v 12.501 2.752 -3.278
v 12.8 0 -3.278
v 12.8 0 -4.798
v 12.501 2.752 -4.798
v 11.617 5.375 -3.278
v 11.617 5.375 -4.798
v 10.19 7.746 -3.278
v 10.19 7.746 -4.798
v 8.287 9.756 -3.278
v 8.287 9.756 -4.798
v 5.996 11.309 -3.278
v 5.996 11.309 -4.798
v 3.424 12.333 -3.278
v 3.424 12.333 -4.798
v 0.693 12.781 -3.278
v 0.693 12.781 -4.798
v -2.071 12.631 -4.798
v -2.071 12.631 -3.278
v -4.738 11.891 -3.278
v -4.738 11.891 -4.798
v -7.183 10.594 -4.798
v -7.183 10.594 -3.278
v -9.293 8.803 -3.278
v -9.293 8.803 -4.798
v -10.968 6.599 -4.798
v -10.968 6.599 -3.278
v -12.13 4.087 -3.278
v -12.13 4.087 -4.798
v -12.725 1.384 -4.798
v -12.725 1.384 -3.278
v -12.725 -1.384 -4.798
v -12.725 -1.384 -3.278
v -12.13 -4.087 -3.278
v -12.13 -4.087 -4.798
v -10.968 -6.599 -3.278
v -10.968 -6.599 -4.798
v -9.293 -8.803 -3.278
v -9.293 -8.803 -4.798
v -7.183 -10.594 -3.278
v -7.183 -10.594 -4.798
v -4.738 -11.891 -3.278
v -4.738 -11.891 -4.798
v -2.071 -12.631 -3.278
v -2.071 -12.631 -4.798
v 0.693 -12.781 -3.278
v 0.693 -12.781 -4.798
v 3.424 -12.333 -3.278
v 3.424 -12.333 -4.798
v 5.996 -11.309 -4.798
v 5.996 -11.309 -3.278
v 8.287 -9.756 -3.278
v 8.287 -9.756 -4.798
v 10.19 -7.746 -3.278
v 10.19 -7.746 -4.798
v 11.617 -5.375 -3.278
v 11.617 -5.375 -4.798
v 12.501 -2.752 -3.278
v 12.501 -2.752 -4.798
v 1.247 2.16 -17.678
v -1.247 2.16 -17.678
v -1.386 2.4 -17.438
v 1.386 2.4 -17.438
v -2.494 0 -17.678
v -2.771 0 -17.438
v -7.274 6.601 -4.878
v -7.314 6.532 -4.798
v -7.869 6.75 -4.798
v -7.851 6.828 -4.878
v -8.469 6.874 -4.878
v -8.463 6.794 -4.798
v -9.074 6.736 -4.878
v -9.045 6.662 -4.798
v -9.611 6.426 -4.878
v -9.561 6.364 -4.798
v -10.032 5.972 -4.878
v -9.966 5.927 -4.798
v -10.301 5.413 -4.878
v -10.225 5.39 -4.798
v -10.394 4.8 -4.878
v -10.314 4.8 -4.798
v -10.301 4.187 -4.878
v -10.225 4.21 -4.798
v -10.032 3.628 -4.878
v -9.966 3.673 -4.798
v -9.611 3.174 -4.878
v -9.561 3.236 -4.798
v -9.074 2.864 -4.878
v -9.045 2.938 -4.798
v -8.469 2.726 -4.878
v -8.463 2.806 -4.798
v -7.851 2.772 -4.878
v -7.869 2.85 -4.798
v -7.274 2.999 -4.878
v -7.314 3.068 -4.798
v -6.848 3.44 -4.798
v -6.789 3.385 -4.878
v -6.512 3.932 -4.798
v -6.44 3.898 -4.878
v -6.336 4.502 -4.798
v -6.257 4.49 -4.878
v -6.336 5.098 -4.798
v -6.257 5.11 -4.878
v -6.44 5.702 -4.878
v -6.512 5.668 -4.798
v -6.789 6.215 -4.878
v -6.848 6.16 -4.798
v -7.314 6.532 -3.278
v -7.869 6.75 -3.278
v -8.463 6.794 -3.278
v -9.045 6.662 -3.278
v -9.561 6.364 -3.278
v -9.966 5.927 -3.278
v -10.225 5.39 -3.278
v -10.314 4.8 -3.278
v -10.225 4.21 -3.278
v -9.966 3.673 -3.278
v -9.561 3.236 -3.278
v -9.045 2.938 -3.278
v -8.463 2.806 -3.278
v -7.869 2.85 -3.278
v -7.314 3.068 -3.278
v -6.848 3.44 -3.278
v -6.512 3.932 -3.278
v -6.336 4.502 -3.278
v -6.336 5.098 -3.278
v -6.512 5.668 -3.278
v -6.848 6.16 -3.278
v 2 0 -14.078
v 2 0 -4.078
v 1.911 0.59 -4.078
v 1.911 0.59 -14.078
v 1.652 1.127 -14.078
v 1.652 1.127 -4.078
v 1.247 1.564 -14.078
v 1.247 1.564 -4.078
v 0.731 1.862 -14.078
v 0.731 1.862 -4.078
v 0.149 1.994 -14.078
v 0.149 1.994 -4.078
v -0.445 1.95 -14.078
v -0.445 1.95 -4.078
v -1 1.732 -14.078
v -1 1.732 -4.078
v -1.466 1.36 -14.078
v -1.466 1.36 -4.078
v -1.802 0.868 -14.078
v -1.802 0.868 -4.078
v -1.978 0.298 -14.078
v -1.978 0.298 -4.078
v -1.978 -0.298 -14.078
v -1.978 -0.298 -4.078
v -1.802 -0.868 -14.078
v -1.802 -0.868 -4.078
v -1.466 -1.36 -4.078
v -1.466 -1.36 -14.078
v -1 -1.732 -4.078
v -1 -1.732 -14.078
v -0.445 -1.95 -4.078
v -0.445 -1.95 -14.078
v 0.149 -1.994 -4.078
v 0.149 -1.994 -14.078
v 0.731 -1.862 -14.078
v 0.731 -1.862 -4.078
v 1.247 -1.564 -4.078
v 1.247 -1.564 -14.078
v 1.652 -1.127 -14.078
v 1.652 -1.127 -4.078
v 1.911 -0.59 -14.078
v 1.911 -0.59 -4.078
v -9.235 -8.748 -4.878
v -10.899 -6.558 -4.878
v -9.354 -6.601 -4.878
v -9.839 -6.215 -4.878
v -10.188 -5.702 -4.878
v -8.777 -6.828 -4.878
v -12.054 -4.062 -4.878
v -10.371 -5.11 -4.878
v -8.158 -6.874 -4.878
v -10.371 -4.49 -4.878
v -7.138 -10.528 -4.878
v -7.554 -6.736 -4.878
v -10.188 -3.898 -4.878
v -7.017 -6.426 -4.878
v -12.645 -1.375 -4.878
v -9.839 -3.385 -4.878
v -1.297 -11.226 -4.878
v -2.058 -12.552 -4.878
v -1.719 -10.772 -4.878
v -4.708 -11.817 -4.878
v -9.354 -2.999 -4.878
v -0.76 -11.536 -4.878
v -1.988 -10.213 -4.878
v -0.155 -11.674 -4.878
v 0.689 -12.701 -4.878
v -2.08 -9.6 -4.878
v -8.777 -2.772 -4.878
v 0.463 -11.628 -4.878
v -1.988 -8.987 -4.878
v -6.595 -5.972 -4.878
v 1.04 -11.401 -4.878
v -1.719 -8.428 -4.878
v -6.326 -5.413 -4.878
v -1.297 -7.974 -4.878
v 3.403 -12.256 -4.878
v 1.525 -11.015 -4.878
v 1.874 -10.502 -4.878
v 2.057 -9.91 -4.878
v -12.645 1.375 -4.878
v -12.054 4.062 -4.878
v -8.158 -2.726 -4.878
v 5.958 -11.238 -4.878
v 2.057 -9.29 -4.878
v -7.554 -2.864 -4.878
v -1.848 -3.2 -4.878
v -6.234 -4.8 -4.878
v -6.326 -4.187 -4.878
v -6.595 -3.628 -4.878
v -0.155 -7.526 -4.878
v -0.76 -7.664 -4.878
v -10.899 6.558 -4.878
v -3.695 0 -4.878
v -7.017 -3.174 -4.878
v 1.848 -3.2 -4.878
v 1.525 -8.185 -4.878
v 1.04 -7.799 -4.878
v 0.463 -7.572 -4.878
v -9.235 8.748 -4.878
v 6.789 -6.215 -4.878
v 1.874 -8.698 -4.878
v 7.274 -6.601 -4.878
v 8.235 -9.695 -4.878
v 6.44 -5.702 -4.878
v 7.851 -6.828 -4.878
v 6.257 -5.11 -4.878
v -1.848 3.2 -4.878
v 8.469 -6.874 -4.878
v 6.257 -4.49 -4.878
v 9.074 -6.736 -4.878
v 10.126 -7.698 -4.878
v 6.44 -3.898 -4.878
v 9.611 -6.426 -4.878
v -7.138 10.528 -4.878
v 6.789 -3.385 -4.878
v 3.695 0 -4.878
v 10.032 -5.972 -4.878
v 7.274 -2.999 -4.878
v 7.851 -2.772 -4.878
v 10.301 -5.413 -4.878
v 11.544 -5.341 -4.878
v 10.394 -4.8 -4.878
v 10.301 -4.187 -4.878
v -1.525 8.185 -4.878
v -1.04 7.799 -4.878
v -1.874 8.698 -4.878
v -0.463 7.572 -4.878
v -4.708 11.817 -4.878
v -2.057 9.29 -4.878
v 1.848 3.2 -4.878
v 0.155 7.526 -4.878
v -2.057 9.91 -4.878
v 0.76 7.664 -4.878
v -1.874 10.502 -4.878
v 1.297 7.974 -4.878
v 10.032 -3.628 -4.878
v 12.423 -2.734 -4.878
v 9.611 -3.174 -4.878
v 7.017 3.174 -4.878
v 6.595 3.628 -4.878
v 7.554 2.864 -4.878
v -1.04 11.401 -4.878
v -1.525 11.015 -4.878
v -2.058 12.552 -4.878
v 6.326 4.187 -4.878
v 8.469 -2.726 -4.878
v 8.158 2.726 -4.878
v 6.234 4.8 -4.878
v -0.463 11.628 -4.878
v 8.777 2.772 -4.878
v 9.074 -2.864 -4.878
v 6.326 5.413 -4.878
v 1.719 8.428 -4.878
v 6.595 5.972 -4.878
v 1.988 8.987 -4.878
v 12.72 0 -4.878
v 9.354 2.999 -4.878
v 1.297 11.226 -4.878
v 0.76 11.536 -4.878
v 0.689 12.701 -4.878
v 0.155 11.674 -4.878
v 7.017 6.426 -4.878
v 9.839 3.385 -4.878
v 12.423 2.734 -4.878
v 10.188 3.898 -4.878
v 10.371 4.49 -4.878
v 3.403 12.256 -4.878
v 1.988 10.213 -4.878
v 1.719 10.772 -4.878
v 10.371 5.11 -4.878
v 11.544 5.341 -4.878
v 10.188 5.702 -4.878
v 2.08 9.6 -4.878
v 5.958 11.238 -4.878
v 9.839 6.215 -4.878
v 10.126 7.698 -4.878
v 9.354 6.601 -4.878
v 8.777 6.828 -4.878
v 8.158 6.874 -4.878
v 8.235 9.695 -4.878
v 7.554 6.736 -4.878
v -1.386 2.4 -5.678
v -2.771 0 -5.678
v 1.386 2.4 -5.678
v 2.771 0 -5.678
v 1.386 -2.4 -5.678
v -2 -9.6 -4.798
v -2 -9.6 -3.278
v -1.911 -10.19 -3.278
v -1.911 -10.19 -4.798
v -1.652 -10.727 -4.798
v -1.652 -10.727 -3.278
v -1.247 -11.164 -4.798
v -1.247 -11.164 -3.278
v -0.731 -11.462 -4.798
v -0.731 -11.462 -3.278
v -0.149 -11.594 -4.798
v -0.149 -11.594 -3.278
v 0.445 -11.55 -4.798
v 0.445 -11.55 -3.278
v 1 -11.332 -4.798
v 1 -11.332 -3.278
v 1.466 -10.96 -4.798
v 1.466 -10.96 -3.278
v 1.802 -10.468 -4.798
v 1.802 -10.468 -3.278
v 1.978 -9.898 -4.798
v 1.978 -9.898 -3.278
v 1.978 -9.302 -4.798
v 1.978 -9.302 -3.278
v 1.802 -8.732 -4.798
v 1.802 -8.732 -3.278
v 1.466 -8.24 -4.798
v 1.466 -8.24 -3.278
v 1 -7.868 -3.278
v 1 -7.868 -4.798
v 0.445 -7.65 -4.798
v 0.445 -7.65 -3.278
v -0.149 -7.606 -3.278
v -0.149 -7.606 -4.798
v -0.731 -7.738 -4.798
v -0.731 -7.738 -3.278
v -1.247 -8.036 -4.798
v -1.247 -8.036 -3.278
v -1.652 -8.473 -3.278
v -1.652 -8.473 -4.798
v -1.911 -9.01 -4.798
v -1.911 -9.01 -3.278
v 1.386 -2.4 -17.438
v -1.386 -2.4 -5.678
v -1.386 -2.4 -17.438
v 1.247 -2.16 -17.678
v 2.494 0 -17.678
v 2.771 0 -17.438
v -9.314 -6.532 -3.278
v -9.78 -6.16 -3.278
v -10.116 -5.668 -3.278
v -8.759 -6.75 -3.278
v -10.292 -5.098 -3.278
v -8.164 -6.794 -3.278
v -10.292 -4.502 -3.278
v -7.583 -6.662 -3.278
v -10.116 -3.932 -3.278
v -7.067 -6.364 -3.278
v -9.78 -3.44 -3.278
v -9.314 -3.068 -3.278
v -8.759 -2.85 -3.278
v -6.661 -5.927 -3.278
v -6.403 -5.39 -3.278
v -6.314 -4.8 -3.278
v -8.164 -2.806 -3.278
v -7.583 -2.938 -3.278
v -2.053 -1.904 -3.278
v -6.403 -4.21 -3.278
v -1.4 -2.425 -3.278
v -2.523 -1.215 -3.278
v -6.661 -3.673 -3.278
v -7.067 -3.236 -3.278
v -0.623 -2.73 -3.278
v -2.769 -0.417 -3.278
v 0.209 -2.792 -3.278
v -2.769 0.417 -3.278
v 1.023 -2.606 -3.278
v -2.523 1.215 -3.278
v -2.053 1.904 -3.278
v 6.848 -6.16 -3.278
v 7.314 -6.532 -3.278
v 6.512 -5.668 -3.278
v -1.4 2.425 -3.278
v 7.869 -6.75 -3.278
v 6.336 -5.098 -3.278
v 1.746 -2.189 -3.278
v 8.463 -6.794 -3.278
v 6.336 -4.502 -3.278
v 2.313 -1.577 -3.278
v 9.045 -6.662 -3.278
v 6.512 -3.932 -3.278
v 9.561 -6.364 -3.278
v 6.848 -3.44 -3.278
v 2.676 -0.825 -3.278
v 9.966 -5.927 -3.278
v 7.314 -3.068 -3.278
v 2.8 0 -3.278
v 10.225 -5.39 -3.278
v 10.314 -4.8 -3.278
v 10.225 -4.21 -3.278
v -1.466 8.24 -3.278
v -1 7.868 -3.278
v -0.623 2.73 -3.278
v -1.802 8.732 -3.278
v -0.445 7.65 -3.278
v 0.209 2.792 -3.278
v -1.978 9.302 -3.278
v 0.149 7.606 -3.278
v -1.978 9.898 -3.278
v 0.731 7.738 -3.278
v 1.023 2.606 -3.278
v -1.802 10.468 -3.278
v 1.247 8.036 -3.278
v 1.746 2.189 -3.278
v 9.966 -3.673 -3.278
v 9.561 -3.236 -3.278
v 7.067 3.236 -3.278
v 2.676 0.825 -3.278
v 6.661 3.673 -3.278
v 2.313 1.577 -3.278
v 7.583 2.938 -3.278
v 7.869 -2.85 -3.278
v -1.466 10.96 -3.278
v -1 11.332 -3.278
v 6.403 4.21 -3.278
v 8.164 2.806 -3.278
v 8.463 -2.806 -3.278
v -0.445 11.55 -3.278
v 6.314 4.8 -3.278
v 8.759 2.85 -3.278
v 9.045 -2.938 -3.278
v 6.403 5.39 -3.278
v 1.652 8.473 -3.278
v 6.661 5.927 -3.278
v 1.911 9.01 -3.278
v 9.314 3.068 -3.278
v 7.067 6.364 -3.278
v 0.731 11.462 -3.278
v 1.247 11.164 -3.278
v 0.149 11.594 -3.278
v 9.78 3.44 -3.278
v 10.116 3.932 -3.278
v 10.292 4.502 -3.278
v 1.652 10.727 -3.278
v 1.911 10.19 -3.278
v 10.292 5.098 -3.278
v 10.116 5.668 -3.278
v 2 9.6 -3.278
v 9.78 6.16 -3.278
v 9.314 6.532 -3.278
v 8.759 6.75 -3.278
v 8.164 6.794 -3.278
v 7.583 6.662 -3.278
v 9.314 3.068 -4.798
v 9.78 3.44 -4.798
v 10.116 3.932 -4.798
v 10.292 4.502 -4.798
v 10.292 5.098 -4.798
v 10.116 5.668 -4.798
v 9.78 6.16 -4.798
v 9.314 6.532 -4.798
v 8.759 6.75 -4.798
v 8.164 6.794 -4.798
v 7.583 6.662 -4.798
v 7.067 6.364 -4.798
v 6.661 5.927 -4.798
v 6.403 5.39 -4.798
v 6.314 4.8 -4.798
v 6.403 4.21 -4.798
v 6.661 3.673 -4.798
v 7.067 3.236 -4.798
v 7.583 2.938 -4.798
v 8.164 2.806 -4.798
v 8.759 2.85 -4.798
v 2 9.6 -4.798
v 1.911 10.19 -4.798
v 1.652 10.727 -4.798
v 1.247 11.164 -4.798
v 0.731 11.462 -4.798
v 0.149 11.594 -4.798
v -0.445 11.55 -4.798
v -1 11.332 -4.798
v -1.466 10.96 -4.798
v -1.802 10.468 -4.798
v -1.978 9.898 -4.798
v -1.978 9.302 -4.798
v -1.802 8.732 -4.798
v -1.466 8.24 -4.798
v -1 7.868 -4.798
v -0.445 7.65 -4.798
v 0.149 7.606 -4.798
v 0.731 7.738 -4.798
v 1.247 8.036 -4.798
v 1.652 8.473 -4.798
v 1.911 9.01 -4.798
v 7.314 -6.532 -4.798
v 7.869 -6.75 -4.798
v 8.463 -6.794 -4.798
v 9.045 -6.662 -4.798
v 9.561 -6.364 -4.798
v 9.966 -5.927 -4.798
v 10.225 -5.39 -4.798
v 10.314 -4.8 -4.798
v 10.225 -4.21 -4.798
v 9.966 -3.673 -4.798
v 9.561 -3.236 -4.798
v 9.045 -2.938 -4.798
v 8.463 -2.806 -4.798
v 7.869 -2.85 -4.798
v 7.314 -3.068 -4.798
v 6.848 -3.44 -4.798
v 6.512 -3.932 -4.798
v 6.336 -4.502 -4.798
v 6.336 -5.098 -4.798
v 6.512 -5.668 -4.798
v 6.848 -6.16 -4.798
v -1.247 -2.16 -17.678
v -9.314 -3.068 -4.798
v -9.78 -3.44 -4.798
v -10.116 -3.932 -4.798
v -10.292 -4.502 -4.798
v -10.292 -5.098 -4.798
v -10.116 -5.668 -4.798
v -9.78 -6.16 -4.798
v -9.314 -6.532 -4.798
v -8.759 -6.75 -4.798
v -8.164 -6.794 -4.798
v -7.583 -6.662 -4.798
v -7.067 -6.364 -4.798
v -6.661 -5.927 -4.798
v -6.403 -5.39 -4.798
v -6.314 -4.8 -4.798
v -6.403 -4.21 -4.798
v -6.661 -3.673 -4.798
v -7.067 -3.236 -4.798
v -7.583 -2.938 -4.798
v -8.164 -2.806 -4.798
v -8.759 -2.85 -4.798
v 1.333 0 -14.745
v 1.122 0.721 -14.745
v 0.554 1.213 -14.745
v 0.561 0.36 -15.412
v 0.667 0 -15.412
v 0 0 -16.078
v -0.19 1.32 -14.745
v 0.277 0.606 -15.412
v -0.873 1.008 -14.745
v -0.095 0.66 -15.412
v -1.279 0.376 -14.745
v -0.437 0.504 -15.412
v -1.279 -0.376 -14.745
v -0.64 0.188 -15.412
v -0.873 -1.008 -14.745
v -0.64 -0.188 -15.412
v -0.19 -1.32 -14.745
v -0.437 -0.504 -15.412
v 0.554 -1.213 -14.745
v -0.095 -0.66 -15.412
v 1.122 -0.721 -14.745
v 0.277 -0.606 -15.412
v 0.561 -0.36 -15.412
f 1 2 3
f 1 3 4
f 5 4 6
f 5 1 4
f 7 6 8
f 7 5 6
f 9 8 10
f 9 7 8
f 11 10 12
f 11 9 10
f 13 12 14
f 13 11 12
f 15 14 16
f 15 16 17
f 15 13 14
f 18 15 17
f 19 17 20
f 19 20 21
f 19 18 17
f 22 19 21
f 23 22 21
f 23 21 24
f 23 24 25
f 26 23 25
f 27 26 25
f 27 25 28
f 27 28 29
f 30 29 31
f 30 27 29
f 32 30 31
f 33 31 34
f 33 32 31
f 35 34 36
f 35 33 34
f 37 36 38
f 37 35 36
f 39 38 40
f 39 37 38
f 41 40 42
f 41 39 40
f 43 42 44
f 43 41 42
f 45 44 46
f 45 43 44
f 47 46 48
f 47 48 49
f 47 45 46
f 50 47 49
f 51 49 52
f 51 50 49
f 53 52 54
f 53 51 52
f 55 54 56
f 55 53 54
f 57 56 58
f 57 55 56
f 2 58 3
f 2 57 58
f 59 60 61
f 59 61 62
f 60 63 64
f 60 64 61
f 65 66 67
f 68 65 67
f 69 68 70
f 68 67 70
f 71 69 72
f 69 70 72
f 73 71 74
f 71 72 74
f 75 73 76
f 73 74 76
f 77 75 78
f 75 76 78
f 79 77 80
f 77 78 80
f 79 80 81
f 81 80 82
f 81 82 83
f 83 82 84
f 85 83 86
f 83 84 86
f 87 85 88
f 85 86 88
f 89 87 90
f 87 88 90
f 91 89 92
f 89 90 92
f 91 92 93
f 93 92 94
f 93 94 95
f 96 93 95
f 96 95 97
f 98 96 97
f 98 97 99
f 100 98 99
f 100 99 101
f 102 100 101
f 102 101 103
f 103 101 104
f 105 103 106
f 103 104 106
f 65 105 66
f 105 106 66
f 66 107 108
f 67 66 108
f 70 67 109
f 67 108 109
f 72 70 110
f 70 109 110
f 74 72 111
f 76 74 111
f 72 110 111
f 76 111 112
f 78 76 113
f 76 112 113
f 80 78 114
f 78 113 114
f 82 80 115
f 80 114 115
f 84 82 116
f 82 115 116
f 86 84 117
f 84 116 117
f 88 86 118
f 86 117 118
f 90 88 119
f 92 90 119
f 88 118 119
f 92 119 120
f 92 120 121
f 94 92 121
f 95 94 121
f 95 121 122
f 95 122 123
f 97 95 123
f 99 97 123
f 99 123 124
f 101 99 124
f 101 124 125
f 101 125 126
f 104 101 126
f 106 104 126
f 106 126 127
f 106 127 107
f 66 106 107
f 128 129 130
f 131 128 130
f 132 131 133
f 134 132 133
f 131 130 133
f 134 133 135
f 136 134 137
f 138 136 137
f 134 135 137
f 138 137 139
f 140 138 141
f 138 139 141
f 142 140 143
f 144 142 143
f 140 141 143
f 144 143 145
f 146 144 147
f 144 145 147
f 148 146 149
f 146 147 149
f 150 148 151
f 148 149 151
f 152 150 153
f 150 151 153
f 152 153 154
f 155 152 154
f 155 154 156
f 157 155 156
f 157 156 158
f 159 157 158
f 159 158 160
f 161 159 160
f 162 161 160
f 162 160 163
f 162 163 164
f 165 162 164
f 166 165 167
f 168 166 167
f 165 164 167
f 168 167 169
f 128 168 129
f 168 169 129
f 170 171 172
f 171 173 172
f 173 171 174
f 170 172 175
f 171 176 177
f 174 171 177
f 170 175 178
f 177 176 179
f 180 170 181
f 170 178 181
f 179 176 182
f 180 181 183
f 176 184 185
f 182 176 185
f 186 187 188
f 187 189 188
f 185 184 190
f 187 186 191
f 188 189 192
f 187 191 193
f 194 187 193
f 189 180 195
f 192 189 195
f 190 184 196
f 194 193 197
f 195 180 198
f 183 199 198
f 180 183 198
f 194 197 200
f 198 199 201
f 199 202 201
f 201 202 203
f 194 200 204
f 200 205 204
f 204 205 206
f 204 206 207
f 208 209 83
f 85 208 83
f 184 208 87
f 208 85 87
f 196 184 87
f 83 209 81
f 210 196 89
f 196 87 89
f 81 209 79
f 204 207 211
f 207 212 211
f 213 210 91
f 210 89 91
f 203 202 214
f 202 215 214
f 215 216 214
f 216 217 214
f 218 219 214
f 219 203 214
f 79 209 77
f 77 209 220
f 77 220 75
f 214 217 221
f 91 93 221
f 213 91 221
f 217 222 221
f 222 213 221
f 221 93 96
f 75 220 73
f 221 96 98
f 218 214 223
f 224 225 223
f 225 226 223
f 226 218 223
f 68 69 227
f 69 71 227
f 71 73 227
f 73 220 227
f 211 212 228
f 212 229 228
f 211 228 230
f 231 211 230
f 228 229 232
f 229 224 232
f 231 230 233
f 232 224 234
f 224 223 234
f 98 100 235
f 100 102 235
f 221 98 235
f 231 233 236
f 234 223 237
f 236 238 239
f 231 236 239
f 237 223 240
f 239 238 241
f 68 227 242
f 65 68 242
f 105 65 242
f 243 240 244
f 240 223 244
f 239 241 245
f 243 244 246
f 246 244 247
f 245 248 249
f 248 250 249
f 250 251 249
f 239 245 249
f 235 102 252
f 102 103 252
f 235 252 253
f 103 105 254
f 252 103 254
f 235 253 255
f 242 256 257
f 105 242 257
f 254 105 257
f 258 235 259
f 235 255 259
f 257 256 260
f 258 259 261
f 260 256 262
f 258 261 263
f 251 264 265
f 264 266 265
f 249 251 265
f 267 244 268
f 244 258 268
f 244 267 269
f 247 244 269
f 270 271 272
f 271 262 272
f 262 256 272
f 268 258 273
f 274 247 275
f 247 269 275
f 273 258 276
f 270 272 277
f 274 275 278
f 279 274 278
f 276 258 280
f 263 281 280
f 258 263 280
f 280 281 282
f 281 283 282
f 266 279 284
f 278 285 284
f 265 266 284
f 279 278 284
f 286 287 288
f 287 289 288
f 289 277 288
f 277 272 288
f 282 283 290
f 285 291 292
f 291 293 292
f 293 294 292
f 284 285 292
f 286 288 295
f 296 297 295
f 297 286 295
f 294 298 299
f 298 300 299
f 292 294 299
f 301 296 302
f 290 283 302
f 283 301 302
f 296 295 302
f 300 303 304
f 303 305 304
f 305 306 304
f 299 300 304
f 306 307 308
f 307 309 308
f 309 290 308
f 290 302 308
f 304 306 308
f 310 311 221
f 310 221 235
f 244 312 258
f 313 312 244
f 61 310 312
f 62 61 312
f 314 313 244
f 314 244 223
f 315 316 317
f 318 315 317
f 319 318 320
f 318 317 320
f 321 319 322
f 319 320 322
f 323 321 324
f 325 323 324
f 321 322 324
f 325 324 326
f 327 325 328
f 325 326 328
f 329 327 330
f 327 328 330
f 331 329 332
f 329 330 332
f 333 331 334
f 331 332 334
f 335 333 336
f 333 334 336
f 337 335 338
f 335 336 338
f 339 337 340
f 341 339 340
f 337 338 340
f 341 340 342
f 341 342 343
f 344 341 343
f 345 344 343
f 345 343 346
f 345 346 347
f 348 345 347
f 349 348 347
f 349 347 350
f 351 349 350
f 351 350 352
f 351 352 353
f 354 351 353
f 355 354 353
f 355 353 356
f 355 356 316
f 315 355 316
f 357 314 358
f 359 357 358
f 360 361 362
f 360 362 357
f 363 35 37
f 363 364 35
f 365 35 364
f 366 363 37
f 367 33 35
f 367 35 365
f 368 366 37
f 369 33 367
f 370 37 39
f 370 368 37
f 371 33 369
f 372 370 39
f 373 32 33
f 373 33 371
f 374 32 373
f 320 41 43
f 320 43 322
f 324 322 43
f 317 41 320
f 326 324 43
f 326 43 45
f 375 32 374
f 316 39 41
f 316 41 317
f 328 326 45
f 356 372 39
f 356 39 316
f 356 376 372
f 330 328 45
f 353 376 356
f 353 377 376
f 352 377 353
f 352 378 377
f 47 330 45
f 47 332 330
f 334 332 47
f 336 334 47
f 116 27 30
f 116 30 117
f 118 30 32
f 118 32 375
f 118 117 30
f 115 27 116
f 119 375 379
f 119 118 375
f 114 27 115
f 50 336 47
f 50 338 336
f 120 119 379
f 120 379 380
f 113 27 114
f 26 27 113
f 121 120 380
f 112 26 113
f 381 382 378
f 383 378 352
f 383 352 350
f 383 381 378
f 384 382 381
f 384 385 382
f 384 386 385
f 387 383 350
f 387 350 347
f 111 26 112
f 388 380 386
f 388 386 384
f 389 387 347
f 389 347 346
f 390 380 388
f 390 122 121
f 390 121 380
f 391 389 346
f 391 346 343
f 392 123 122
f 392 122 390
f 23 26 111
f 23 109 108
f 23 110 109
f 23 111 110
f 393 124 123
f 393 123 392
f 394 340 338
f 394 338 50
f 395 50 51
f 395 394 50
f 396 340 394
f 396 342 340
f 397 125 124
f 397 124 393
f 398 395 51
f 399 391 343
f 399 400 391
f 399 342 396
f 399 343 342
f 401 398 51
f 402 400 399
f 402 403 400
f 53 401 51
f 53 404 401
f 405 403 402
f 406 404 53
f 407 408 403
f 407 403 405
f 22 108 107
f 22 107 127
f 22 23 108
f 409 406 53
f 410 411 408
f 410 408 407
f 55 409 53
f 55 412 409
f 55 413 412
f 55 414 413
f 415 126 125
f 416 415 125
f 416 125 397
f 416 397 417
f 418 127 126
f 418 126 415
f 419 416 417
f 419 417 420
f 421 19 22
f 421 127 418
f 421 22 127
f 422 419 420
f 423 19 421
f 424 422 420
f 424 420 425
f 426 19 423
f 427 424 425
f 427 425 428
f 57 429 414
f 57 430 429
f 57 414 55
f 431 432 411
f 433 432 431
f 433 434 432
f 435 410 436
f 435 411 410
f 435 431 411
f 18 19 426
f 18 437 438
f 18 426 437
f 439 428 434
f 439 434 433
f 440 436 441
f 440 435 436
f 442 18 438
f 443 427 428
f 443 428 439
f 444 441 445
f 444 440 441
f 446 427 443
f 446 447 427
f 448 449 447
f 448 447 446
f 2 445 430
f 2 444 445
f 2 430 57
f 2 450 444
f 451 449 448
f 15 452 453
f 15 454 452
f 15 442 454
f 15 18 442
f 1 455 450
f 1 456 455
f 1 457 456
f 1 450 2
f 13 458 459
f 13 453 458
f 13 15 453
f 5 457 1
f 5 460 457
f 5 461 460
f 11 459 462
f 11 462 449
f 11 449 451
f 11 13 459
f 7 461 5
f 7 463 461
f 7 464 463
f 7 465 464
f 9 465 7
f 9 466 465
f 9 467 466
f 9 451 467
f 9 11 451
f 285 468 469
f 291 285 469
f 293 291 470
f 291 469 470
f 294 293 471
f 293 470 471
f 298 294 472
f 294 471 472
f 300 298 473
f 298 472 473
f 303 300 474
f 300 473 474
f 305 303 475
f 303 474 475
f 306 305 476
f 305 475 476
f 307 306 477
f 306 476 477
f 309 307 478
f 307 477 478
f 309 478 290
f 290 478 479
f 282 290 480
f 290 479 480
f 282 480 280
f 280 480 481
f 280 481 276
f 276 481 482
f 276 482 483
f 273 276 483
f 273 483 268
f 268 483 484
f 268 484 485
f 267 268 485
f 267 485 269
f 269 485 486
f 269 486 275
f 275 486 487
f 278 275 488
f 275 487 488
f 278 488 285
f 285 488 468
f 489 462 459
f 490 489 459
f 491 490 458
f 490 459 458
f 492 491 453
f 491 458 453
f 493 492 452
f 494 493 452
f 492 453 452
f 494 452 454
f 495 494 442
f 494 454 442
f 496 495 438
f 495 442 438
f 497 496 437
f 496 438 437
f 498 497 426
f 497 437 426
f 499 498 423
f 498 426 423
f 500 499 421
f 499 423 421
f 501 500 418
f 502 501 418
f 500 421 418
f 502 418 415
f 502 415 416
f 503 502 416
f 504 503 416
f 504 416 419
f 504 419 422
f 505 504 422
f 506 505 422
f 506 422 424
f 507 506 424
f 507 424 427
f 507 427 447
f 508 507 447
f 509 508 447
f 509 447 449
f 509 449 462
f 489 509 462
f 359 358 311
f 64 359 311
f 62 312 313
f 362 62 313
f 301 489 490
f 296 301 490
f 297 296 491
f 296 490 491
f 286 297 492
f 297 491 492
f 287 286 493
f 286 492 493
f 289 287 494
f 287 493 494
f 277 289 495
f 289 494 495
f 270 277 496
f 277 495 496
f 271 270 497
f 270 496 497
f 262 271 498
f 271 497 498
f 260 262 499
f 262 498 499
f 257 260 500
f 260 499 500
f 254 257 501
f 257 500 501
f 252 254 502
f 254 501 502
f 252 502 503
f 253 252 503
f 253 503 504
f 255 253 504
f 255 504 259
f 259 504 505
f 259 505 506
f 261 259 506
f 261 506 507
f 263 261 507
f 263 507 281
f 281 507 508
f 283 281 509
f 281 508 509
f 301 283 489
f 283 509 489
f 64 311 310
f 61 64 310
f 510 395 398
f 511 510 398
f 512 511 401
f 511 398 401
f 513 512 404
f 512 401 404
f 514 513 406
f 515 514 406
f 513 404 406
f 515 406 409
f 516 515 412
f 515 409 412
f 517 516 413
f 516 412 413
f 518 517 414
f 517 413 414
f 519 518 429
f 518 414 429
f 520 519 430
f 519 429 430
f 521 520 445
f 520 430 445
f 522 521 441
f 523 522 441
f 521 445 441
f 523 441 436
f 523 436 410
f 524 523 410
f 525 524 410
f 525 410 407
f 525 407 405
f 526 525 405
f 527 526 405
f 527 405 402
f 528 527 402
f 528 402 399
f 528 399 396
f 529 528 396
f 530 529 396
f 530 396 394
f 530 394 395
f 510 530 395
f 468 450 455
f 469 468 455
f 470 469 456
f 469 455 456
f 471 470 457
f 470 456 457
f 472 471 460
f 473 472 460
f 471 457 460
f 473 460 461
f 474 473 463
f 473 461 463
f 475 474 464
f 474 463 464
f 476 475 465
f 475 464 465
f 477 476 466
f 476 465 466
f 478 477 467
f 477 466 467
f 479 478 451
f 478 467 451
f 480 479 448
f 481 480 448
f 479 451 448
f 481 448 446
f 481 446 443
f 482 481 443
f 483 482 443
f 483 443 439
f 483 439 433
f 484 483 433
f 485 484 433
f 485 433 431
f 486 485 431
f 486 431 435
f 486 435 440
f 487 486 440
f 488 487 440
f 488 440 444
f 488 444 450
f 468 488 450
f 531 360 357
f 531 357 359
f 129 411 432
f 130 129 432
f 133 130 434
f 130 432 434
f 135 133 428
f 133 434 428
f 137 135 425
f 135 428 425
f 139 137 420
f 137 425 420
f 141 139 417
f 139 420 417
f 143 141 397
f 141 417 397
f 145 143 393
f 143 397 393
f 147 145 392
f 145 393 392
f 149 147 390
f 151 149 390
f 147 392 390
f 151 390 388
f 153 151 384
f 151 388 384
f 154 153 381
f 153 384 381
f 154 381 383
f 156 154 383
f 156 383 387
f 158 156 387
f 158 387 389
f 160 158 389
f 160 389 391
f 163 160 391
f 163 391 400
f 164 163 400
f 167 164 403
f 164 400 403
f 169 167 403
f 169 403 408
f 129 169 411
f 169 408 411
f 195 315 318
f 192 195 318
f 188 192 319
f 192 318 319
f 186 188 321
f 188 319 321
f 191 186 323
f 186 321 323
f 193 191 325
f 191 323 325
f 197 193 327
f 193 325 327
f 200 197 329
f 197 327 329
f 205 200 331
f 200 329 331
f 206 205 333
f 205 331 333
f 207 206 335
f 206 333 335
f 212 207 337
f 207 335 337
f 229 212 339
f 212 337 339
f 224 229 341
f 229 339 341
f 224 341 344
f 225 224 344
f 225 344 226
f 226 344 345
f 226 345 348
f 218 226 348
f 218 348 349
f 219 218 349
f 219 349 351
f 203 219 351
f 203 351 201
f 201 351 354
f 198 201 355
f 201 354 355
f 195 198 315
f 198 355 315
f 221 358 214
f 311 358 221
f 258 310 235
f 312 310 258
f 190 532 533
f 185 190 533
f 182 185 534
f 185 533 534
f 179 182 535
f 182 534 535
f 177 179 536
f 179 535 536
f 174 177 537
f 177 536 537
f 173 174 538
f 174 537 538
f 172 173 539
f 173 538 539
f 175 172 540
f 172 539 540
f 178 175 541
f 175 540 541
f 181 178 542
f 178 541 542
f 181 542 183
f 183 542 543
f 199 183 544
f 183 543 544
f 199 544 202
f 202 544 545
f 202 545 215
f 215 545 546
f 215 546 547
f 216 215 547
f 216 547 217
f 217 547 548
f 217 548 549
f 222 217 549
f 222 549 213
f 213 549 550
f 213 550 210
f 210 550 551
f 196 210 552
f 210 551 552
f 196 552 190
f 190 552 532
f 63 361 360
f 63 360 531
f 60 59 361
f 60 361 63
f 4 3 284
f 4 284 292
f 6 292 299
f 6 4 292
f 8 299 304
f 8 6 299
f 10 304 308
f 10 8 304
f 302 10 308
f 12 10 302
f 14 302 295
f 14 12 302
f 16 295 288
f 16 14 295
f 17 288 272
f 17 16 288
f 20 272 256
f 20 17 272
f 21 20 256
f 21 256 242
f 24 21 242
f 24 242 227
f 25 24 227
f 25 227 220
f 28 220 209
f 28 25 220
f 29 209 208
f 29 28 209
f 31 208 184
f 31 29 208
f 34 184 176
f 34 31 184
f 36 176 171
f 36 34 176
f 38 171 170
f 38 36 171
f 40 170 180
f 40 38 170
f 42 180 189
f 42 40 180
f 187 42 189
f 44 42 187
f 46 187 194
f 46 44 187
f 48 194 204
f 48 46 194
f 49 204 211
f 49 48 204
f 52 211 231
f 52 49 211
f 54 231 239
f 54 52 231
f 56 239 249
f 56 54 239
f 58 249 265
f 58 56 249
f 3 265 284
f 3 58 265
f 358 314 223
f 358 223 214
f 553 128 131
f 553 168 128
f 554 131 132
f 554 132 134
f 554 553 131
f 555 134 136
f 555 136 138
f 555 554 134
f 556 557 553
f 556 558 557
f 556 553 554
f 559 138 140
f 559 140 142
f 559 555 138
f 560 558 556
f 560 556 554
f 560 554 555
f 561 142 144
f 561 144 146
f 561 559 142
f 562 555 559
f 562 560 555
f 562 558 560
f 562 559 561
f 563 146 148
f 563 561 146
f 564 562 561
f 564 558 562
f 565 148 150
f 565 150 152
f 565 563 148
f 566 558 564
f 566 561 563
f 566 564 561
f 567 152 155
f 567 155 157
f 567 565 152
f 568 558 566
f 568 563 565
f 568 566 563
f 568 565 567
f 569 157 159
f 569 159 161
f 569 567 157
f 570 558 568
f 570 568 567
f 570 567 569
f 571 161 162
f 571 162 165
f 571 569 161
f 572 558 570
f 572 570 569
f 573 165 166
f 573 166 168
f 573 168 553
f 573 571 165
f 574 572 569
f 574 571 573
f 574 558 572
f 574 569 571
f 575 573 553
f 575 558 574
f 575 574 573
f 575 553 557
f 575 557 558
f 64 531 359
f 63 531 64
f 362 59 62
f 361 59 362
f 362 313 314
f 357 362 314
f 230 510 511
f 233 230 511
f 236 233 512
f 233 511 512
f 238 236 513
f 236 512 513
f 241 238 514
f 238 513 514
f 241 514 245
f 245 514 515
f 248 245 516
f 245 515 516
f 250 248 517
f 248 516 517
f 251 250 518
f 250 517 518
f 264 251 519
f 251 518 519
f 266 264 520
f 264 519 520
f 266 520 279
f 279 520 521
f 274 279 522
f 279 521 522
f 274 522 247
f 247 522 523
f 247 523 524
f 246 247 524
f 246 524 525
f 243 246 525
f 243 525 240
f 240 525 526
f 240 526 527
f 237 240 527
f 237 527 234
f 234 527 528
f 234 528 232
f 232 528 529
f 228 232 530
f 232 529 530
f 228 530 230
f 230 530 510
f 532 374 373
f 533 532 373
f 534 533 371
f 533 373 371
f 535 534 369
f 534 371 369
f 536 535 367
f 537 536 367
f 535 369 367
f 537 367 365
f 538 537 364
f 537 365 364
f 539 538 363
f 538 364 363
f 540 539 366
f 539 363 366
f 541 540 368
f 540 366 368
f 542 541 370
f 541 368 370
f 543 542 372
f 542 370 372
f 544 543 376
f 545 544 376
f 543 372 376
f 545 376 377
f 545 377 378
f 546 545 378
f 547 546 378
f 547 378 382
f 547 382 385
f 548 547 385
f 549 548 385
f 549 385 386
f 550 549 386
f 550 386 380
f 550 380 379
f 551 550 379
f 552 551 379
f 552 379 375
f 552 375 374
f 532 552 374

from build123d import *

# Parameters (mm, degrees)
SKETCH1_R           = 32
BOSS_EXTRUDE1_DEPTH = 4
SKETCH2_R           = 5
CUT_EXTRUDE1_DEPTH  = 46.431266766
CIRPATTERN1_COUNT   = 6
BOSS_EXTRUDE2_DEPTH = 32
CHAMFER1_SIZE       = 2
CHAMFER2_SIZE       = 0.2
SKETCH4_R           = 5
CUT_EXTRUDE2_DEPTH  = 32
CHAMFER3_SIZE       = 0.6
CHAMFER4_SIZE       = 5
CHAMFER5_SIZE       = 2
SCALE1_SCALE        = 0.4


with BuildPart() as part:
    # Sketch1 → Boss-Extrude1 (new body)
    with BuildSketch(Plane.XY):
        Circle(SKETCH1_R)
    extrude(amount=-BOSS_EXTRUDE1_DEPTH)

    # Sketch2 → Cut-Extrude1 (cut, through all)
    with BuildSketch(Plane.XY):
        with Locations((0, 24)):
            Circle(SKETCH2_R)
    cut_extrude1 = extrude(amount=-CUT_EXTRUDE1_DEPTH, mode=Mode.SUBTRACT)

    # CirPattern1: Cut-Extrude1 ×6 about axis
    cirpattern1_axis = Axis((0, 0, 0), (0, 0, 1))
    for i in range(1, CIRPATTERN1_COUNT):
        add(cut_extrude1.rotate(cirpattern1_axis, i * 360 / CIRPATTERN1_COUNT), mode=Mode.SUBTRACT)

    # Sketch3 → Boss-Extrude2 (add)
    with BuildSketch(Plane(origin=(0, 0, -4), x_dir=(-1, 0, 0), z_dir=(0, 0, -1))):
        Polygon((-3.464101615, 6), (-6.92820323, 0), (-3.464101615, -6), (3.464101615, -6), (6.92820323, 0), (3.464101615, 6), align=None)
    extrude(amount=BOSS_EXTRUDE2_DEPTH)

    # Chamfer1
    chamfer1_edges = [part.edges().sort_by_distance(p)[0] for p in [
        (0, 6, -4),
        (5.196152423, 3, -4),
        (5.196152423, -3, -4),
        (0, -6, -4),
        (-5.196152423, -3, -4),
        (-5.196152423, 3, -4),
    ]]
    chamfer(chamfer1_edges, length=CHAMFER1_SIZE)

    # Chamfer2
    chamfer2_edges = [part.edges().sort_by_distance(p)[0] for p in [
        (-23.284609691, 7.669872981, -4),
        (-18.284609691, -16.330127019, -4),
        (5, -24, -4),
        (23.284609691, -7.669872981, -4),
        (18.284609691, 16.330127019, -4),
        (-32, 0, -4),
        (-5, 24, -4),
    ]]
    chamfer(chamfer2_edges, length=CHAMFER2_SIZE)

    # Sketch4 → Cut-Extrude2 (cut)
    with BuildSketch(Plane.XY):
        Circle(SKETCH4_R)
    extrude(amount=-CUT_EXTRUDE2_DEPTH, mode=Mode.SUBTRACT)

    # Chamfer3
    chamfer3_edges = [part.edges().sort_by_distance(p)[0] for p in [
        (0, 6, -36),
        (5.196152423, 3, -36),
        (5.196152423, -3, -36),
        (0, -6, -36),
        (-5.196152423, -3, -36),
        (-5.196152423, 3, -36),
    ]]
    chamfer(chamfer3_edges, length=CHAMFER3_SIZE)

    # Chamfer4
    chamfer4_edges = [part.edges().sort_by_distance(p)[0] for p in [
        (-5, 0, -32),
    ]]
    chamfer(chamfer4_edges, length=CHAMFER4_SIZE)

    # Chamfer5
    chamfer5_edges = [part.edges().sort_by_distance(p)[0] for p in [
        (-5, 0, 0),
    ]]
    chamfer(chamfer5_edges, length=CHAMFER5_SIZE)


with BuildPart() as part_1:
    # Scale1: scaled about (0, 0, -5.463972753)
    add(part.part.scale(SCALE1_SCALE).moved(Location((0, 0, -3.278383652))))


solid = part_1.part
